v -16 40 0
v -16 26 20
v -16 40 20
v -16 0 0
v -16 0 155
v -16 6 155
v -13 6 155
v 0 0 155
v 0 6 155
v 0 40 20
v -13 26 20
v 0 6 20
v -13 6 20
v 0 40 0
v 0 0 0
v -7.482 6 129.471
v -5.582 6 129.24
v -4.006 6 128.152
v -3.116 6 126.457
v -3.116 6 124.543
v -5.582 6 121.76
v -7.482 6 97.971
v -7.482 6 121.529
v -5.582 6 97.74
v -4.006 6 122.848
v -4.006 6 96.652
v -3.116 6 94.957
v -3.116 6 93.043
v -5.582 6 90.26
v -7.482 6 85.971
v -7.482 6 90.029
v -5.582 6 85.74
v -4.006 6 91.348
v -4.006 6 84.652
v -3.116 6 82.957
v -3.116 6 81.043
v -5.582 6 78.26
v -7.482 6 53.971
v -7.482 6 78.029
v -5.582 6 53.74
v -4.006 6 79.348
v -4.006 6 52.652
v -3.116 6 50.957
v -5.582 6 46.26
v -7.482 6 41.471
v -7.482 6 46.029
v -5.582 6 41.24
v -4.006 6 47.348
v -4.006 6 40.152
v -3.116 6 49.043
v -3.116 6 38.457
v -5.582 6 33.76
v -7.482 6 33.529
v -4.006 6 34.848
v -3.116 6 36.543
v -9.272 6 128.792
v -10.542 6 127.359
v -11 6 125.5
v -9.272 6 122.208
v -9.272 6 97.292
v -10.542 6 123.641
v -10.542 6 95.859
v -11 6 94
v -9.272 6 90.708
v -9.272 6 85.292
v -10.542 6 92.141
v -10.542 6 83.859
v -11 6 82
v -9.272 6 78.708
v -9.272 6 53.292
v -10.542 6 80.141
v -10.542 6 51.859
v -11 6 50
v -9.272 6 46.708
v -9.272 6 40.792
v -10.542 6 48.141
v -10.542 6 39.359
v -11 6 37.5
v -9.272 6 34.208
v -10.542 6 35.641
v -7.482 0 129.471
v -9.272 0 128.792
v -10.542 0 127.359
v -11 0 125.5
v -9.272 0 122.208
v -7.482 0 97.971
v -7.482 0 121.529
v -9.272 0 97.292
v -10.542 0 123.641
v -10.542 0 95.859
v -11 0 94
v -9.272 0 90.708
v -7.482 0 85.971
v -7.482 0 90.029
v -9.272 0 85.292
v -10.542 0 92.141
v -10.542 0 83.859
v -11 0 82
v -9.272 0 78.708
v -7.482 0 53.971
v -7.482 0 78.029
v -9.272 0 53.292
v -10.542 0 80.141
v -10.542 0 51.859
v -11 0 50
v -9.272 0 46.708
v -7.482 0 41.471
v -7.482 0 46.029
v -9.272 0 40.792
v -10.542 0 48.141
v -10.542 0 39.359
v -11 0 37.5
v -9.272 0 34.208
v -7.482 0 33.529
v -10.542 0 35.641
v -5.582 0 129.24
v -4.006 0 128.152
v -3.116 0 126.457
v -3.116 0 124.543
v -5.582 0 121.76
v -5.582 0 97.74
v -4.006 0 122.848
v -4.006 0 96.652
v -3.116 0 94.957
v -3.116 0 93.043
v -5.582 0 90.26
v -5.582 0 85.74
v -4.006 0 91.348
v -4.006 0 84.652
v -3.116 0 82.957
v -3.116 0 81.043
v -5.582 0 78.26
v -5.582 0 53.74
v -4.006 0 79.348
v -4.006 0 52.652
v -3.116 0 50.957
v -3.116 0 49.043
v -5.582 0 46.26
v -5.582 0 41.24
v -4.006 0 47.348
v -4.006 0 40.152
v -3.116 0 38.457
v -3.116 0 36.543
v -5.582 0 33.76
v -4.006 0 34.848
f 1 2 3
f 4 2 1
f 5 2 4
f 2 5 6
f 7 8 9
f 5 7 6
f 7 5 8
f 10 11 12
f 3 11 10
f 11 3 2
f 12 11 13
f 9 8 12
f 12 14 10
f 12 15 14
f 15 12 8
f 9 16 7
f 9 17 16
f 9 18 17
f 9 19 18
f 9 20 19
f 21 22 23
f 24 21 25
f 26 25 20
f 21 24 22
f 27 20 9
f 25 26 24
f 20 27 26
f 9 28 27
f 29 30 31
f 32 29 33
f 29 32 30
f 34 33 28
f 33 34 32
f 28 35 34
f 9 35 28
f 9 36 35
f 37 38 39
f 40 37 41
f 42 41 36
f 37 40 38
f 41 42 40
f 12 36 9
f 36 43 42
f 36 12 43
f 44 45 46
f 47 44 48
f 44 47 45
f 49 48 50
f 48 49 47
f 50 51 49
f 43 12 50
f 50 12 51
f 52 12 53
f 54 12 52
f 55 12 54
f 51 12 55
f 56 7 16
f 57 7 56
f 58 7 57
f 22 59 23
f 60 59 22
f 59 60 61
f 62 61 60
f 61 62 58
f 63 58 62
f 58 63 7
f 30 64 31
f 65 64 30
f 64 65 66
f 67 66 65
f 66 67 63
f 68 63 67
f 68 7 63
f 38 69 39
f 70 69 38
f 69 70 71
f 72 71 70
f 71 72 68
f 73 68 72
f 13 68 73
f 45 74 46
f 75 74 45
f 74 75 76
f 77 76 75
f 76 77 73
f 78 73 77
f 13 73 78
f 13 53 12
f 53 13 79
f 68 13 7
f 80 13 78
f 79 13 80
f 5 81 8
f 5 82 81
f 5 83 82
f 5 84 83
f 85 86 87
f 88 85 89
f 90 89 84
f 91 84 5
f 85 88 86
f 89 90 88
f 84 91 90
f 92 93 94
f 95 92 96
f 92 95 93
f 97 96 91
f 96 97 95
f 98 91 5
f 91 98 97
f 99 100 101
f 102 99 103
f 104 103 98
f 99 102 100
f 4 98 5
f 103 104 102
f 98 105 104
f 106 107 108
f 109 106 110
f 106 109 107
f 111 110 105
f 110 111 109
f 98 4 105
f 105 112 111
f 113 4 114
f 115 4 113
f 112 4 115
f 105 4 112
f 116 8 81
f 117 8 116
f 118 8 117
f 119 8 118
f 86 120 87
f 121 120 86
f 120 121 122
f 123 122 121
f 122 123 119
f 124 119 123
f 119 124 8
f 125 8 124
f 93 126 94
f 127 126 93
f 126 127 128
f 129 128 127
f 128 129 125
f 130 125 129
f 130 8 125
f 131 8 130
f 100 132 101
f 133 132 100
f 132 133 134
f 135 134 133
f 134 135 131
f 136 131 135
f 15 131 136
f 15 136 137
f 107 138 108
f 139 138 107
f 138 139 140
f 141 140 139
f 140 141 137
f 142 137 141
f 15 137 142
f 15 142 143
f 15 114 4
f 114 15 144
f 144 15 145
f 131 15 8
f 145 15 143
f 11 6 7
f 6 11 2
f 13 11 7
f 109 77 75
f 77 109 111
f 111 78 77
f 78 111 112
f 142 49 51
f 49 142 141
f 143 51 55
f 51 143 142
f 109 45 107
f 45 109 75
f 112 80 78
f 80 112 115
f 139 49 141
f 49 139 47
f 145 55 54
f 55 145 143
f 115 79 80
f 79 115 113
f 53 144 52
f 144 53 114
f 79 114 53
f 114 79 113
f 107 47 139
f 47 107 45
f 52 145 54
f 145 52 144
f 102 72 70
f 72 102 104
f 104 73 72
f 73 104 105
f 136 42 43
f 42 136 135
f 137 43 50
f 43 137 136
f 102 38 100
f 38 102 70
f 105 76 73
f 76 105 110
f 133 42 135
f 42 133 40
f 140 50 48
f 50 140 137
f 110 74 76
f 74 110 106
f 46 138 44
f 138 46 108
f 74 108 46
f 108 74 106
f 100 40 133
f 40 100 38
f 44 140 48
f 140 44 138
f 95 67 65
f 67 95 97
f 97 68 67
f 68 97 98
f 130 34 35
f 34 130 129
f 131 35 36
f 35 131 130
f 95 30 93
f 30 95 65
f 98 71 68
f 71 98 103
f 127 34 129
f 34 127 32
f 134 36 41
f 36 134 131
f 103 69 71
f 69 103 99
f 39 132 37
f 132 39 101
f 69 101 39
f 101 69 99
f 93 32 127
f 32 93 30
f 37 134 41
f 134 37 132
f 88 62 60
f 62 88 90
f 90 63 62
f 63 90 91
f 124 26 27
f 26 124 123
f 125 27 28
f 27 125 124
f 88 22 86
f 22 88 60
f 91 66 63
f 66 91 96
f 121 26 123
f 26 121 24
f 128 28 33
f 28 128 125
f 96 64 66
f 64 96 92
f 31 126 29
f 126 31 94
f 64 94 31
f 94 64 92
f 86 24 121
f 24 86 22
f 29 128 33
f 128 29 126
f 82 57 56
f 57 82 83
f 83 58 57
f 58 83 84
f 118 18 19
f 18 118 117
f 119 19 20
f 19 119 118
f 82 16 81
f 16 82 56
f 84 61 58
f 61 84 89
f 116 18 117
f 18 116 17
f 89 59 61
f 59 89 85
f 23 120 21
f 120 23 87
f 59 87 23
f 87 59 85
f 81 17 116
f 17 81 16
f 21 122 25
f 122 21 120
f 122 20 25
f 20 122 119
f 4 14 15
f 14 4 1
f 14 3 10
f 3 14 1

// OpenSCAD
type = "left"; // [left, right]
mountWidth = 7 + 9;
mountDepth = 6;
mountHeight = 135;
sideWallDepth = 20;
sideWallThickness = 3;
basePlateWidth = mountWidth;
basePlateDepth = 40;
basePlateThickness = 20;

holeDiameter = 8;
holePositionX = 7;
holePositionsY = [37.5, 50, 82, 94, 125.5];

module poland_rack_mount() {

  cube([basePlateWidth, basePlateDepth, basePlateThickness]);

  difference() {
    translate([0, 0, basePlateThickness]) {

      cube([mountWidth, mountDepth, mountHeight]);

      translate([mountWidth, mountDepth, 0])
      rotate([0, -90, 0])
        linear_extrude(sideWallThickness)
          polygon([
            [0, 0],
            [0, sideWallDepth],
            [mountHeight, 0]
          ]);

    }

    #hole_puncher();
  }

}

module hole_puncher() {

  translate([holePositionX, 0, 0]) {

    for (holePosY=holePositionsY) {
      translate([0, mountDepth/2, holePosY])
      rotate([90, 0, 0])
        #cylinder(d=holeDiameter, h=mountDepth, center=true);
    }
  
  }
  
}

if (type == "left") {
  mirror([1, 0, 0]) {
    poland_rack_mount();
  }
} else {
  poland_rack_mount();
}
